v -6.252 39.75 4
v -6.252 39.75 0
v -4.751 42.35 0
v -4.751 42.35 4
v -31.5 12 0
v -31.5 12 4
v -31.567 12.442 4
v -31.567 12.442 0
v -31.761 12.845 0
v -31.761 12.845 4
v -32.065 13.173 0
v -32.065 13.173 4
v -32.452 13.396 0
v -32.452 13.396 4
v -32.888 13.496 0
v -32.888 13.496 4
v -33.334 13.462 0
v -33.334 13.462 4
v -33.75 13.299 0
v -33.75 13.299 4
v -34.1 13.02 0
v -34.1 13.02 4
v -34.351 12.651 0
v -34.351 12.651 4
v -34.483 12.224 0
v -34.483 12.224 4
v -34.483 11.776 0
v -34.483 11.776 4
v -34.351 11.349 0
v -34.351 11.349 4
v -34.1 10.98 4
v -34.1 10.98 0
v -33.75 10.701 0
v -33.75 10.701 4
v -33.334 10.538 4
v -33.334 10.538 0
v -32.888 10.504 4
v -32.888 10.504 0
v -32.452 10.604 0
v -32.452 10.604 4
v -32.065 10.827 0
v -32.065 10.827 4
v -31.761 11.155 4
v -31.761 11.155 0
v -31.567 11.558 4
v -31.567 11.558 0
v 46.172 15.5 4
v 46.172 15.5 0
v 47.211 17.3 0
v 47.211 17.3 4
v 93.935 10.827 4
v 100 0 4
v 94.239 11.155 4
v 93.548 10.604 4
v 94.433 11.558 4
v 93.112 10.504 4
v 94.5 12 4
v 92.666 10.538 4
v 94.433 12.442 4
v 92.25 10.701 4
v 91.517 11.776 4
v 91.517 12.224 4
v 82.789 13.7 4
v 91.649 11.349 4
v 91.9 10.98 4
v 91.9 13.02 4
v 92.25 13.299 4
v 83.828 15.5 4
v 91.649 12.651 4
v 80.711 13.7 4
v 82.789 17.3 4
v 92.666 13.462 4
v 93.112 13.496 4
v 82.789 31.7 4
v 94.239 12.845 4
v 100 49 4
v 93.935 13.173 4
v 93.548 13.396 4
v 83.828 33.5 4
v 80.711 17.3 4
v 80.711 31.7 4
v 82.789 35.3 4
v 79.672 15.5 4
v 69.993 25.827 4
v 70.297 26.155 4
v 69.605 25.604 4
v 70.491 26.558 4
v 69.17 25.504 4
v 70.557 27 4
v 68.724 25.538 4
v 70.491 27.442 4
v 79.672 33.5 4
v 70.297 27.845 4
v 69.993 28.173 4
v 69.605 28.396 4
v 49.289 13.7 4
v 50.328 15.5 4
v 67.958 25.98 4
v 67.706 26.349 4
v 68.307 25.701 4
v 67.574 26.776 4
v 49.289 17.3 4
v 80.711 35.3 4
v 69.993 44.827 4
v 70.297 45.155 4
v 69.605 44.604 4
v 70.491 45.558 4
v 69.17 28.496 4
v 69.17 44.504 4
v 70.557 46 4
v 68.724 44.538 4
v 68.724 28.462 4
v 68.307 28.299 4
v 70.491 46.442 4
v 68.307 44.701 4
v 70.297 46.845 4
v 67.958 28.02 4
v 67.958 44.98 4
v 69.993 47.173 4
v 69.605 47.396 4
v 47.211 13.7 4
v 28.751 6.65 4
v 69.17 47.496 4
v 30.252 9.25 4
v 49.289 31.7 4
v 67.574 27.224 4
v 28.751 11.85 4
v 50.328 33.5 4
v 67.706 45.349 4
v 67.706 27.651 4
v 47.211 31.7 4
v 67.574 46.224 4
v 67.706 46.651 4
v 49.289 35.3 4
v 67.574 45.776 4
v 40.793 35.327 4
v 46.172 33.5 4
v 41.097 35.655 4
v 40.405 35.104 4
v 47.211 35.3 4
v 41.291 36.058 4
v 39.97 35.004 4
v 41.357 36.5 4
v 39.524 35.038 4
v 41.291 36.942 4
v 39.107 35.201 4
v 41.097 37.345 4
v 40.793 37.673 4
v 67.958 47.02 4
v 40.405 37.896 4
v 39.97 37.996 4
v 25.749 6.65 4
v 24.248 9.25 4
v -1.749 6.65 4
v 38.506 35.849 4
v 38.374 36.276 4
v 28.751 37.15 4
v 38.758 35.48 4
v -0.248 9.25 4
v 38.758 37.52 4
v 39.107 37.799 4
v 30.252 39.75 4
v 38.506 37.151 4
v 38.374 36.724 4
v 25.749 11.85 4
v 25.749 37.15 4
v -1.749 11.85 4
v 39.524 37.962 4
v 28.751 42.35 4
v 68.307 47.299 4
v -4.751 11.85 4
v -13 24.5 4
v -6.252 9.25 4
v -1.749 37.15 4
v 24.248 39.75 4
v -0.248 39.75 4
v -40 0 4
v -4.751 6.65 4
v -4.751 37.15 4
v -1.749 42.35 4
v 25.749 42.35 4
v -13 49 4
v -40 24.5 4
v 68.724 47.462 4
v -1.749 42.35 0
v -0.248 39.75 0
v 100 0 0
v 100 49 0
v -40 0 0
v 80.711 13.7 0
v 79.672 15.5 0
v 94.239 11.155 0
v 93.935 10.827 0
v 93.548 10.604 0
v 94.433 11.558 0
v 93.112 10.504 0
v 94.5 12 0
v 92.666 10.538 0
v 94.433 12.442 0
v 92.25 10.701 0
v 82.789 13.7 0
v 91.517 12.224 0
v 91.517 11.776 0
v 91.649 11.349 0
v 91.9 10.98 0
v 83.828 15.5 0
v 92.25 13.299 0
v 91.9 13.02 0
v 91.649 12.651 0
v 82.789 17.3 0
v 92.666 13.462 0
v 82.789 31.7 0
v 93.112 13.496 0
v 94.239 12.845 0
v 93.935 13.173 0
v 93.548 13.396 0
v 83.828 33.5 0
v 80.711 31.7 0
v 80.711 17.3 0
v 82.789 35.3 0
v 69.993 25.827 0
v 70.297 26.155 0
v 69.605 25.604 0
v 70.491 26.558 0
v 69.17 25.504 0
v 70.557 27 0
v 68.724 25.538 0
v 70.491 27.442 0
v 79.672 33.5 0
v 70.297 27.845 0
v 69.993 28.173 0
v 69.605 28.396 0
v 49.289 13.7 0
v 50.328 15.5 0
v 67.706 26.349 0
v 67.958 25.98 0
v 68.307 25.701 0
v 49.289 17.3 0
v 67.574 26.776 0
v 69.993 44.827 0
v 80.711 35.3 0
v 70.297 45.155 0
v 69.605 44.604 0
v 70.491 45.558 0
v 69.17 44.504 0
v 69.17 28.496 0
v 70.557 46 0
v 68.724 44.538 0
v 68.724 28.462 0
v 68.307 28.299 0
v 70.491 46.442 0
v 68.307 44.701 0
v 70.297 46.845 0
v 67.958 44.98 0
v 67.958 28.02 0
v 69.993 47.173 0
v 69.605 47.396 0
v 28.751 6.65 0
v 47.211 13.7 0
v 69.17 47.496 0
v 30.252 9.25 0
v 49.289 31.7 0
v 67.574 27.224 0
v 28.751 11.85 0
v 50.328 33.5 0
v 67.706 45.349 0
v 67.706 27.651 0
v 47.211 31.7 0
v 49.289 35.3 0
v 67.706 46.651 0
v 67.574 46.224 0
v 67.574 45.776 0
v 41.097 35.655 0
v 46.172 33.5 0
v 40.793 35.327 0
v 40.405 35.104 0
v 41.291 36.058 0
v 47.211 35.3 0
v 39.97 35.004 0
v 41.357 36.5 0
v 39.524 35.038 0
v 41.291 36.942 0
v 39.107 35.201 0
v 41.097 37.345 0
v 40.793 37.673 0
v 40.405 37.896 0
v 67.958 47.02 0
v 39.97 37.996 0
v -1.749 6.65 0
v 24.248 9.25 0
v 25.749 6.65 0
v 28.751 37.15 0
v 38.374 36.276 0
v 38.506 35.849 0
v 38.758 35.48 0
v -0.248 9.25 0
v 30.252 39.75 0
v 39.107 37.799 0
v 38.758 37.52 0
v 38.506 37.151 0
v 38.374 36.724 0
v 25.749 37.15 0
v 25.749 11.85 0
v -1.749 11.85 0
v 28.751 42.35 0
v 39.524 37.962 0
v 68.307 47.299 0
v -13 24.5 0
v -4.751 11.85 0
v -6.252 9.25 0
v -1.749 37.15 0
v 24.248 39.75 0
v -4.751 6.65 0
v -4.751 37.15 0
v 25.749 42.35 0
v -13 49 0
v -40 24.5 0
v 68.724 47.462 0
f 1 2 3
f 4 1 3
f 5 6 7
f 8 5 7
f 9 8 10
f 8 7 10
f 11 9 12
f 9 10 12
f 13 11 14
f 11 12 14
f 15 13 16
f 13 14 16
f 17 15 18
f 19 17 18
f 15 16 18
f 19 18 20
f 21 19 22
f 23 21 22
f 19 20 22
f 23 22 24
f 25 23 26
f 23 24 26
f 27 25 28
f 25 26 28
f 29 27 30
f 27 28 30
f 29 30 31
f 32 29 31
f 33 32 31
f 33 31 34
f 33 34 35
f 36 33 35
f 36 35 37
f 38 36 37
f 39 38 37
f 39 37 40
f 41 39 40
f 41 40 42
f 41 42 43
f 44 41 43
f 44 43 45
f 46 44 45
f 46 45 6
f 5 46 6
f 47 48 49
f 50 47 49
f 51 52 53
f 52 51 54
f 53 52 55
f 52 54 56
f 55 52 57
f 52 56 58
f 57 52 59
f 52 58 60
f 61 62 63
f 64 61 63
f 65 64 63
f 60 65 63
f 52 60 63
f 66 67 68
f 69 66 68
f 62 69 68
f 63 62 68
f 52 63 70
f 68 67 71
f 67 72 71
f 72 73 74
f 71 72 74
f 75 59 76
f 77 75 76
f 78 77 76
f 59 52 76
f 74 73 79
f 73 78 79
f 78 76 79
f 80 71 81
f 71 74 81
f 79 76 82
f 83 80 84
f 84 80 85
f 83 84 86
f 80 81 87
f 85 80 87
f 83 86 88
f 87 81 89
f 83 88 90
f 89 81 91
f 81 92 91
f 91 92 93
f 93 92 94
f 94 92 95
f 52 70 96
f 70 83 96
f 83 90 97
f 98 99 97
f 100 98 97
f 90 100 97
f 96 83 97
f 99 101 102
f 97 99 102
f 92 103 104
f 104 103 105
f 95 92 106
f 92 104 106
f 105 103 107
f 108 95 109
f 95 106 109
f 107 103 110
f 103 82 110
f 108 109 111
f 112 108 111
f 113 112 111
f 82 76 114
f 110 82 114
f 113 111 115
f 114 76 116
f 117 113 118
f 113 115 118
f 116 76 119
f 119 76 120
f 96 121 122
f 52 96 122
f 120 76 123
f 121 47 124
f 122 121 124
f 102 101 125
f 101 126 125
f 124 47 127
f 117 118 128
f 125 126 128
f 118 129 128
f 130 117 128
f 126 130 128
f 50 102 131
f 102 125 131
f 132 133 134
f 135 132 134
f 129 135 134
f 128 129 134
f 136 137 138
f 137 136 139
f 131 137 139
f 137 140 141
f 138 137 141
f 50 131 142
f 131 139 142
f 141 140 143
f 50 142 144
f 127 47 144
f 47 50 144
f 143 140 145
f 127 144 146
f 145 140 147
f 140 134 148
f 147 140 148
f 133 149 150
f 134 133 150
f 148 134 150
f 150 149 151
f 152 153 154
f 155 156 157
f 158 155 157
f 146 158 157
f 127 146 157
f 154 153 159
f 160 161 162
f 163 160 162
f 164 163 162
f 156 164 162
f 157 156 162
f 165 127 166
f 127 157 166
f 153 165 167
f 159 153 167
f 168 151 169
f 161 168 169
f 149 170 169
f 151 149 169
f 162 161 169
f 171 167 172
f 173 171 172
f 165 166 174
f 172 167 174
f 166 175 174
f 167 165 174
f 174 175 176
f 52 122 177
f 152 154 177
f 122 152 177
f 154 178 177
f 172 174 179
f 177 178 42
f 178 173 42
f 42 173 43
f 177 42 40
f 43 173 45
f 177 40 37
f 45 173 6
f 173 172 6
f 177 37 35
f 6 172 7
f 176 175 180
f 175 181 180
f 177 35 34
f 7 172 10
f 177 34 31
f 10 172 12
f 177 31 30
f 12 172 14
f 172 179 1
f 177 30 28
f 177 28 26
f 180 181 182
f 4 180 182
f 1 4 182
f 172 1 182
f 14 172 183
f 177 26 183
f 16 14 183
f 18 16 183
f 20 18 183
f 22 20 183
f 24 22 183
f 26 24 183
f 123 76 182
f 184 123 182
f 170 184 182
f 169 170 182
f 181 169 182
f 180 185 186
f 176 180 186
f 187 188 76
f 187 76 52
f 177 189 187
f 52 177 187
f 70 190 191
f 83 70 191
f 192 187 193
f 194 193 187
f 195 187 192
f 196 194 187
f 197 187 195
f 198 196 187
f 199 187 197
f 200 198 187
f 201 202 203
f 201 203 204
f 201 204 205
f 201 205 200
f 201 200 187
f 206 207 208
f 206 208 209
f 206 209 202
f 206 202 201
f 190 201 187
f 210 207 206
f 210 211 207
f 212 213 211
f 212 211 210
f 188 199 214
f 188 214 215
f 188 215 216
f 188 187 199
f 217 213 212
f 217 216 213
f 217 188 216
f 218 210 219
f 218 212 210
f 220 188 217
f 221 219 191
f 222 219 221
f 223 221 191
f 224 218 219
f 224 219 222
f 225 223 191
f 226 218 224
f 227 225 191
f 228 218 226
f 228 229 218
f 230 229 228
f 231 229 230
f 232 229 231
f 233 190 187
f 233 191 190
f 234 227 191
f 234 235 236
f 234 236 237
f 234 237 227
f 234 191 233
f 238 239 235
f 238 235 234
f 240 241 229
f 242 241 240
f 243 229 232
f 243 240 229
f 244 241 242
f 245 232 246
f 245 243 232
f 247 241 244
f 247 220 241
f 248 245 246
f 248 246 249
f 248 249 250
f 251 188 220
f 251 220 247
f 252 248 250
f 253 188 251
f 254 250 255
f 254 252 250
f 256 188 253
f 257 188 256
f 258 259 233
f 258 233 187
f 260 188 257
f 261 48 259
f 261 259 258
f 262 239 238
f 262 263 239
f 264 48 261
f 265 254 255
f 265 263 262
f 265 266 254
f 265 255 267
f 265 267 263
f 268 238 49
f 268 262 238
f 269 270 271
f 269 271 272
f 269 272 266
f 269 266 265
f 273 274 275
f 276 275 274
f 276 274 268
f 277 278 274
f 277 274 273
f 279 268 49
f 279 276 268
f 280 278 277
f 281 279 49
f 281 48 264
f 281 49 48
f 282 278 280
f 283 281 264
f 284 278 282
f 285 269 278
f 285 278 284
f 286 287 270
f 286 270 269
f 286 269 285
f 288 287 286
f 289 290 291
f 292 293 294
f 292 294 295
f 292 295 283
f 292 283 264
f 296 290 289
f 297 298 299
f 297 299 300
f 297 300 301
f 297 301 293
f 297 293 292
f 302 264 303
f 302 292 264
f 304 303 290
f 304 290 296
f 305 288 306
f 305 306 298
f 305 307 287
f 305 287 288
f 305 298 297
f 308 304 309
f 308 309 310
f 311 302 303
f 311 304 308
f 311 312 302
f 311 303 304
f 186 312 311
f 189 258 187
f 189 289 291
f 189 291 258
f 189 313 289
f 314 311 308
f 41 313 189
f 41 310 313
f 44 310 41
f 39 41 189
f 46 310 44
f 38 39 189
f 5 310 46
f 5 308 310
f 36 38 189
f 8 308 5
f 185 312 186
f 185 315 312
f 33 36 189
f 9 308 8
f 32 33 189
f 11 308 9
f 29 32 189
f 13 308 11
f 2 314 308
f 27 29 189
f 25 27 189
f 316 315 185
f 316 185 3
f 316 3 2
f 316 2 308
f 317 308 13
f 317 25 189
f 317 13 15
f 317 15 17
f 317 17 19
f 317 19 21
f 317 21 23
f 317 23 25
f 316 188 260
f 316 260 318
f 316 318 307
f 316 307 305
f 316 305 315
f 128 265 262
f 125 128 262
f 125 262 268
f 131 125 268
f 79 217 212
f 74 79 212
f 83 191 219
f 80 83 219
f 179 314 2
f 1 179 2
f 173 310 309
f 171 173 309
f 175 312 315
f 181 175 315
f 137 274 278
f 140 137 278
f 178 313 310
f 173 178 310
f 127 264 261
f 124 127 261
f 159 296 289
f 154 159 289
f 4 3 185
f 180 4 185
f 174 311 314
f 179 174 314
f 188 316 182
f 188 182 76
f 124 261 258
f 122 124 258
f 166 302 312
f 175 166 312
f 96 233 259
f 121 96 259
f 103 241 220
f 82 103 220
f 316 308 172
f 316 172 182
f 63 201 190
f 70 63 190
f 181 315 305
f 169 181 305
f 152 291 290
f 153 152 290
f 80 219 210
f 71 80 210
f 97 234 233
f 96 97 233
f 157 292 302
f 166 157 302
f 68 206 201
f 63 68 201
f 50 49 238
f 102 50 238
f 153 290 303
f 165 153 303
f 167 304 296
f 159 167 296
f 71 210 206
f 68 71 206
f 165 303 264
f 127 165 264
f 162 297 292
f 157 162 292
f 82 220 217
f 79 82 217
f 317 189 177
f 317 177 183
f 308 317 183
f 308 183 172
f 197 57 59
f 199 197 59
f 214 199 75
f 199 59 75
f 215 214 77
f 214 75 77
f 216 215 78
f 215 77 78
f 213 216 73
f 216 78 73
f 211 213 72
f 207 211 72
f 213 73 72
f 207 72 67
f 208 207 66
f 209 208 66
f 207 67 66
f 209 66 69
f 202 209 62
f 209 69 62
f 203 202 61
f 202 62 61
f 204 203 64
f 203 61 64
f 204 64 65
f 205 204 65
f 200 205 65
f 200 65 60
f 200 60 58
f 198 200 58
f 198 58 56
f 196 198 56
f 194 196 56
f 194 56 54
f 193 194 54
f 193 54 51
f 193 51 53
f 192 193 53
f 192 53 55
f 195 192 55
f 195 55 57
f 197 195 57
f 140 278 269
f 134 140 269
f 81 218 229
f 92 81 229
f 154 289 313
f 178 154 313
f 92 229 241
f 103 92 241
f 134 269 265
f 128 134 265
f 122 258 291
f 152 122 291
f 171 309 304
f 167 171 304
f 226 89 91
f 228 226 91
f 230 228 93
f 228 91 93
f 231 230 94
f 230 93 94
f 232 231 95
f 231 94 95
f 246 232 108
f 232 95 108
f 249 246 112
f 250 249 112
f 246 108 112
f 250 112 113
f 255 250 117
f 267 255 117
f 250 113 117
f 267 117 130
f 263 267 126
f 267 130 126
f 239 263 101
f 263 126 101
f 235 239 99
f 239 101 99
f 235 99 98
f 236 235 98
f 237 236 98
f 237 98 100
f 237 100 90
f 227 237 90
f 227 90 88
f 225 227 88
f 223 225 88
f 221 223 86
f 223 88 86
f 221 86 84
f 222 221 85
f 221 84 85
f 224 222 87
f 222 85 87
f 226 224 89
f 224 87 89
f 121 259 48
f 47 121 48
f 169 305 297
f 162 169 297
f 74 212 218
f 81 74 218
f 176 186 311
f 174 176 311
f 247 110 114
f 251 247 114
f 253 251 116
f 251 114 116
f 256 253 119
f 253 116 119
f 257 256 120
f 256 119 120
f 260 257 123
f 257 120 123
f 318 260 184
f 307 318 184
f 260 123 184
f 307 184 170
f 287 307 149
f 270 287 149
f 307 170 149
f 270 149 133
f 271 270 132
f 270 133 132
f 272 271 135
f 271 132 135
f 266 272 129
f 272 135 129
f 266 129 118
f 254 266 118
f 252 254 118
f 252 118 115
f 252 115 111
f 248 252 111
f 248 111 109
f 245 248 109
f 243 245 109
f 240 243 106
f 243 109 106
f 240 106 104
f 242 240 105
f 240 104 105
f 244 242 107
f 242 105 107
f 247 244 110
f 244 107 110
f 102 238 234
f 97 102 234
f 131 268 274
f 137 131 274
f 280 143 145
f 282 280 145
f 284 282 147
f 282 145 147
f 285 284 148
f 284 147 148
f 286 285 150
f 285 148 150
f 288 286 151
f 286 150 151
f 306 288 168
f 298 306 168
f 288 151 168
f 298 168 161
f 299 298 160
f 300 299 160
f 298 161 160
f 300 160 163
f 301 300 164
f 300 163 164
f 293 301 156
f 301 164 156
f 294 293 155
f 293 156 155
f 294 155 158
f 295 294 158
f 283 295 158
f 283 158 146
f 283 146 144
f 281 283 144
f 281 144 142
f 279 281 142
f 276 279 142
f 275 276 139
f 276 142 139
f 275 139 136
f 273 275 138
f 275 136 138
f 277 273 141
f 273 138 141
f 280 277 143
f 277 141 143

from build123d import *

# Parameters (mm, degrees)
BOSS_EXTRUDE1_DEPTH = 4
SKETCH2_R           = 1.5
CUT_EXTRUDE1_DEPTH  = 4
CUT_EXTRUDE5_DEPTH  = 34
CUT_EXTRUDE6_DEPTH  = 34
SKETCH6_R           = 1.5
CUT_EXTRUDE7_DEPTH  = 10


with BuildPart() as part:
    # Sketch1 → Boss-Extrude1 (new body)
    with BuildSketch(Plane.XY):
        Polygon((0, 0), (-40, 0), (-40, 24.5), (-13, 24.5), (-13, 49), (100, 49), (100, 0), align=None)
    extrude(amount=BOSS_EXTRUDE1_DEPTH)

    # Sketch2 → Cut-Extrude1 (cut)
    with BuildSketch(Plane.XY.offset(4)):
        with Locations((39.857429038, 36.5)):
            Circle(SKETCH2_R)
        with Locations((69.057429038, 27)):
            Circle(SKETCH2_R)
        with Locations((69.057429038, 46)):
            Circle(SKETCH2_R)
    extrude(amount=-CUT_EXTRUDE1_DEPTH, mode=Mode.SUBTRACT)

    # Sketch4 → Cut-Extrude5 (cut)
    with BuildSketch(Plane(origin=(0, 0, -4), x_dir=(-1, 0, 0), z_dir=(0, 0, -1))):
        Polygon((-80.710769515, 31.7), (-79.671539031, 33.5), (-80.710769515, 35.3), (-82.789230485, 35.3), (-83.828460969, 33.5), (-82.789230485, 31.7), align=None)
        Polygon((-47.210769515, 31.7), (-46.171539031, 33.5), (-47.210769515, 35.3), (-49.289230485, 35.3), (-50.328460969, 33.5), (-49.289230485, 31.7), align=None)
        Polygon((-47.210769515, 13.7), (-46.171539031, 15.5), (-47.210769515, 17.3), (-49.289230485, 17.3), (-50.328460969, 15.5), (-49.289230485, 13.7), align=None)
        Polygon((-80.710769515, 13.7), (-79.671539031, 15.5), (-80.710769515, 17.3), (-82.789230485, 17.3), (-83.828460969, 15.5), (-82.789230485, 13.7), align=None)
    extrude(amount=-CUT_EXTRUDE5_DEPTH, mode=Mode.SUBTRACT)

    # Sketch5 → Cut-Extrude6 (cut)
    with BuildSketch(Plane(origin=(0, 0, 0), x_dir=(-1, 0, 0), z_dir=(0, 0, -1))):
        Polygon((4.7511107, 37.15), (6.2522214, 39.75), (4.7511107, 42.35), (1.7488893, 42.35), (0.2477786, 39.75), (1.7488893, 37.15), align=None)
        Polygon((-25.7488893, 37.15), (-24.2477786, 39.75), (-25.7488893, 42.35), (-28.7511107, 42.35), (-30.2522214, 39.75), (-28.7511107, 37.15), align=None)
        Polygon((-25.7488893, 6.65), (-24.2477786, 9.25), (-25.7488893, 11.85), (-28.7511107, 11.85), (-30.2522214, 9.25), (-28.7511107, 6.65), align=None)
        Polygon((4.7511107, 6.65), (6.2522214, 9.25), (4.7511107, 11.85), (1.7488893, 11.85), (0.2477786, 9.25), (1.7488893, 6.65), align=None)
    extrude(amount=-CUT_EXTRUDE6_DEPTH, mode=Mode.SUBTRACT)

    # Sketch6 → Cut-Extrude7 (cut)
    with BuildSketch(Plane.XY.offset(4)):
        with Locations((-33, 12)):
            Circle(SKETCH6_R)
        with Locations((93, 12)):
            Circle(SKETCH6_R)
    extrude(amount=-CUT_EXTRUDE7_DEPTH, mode=Mode.SUBTRACT)


solid = part.part
